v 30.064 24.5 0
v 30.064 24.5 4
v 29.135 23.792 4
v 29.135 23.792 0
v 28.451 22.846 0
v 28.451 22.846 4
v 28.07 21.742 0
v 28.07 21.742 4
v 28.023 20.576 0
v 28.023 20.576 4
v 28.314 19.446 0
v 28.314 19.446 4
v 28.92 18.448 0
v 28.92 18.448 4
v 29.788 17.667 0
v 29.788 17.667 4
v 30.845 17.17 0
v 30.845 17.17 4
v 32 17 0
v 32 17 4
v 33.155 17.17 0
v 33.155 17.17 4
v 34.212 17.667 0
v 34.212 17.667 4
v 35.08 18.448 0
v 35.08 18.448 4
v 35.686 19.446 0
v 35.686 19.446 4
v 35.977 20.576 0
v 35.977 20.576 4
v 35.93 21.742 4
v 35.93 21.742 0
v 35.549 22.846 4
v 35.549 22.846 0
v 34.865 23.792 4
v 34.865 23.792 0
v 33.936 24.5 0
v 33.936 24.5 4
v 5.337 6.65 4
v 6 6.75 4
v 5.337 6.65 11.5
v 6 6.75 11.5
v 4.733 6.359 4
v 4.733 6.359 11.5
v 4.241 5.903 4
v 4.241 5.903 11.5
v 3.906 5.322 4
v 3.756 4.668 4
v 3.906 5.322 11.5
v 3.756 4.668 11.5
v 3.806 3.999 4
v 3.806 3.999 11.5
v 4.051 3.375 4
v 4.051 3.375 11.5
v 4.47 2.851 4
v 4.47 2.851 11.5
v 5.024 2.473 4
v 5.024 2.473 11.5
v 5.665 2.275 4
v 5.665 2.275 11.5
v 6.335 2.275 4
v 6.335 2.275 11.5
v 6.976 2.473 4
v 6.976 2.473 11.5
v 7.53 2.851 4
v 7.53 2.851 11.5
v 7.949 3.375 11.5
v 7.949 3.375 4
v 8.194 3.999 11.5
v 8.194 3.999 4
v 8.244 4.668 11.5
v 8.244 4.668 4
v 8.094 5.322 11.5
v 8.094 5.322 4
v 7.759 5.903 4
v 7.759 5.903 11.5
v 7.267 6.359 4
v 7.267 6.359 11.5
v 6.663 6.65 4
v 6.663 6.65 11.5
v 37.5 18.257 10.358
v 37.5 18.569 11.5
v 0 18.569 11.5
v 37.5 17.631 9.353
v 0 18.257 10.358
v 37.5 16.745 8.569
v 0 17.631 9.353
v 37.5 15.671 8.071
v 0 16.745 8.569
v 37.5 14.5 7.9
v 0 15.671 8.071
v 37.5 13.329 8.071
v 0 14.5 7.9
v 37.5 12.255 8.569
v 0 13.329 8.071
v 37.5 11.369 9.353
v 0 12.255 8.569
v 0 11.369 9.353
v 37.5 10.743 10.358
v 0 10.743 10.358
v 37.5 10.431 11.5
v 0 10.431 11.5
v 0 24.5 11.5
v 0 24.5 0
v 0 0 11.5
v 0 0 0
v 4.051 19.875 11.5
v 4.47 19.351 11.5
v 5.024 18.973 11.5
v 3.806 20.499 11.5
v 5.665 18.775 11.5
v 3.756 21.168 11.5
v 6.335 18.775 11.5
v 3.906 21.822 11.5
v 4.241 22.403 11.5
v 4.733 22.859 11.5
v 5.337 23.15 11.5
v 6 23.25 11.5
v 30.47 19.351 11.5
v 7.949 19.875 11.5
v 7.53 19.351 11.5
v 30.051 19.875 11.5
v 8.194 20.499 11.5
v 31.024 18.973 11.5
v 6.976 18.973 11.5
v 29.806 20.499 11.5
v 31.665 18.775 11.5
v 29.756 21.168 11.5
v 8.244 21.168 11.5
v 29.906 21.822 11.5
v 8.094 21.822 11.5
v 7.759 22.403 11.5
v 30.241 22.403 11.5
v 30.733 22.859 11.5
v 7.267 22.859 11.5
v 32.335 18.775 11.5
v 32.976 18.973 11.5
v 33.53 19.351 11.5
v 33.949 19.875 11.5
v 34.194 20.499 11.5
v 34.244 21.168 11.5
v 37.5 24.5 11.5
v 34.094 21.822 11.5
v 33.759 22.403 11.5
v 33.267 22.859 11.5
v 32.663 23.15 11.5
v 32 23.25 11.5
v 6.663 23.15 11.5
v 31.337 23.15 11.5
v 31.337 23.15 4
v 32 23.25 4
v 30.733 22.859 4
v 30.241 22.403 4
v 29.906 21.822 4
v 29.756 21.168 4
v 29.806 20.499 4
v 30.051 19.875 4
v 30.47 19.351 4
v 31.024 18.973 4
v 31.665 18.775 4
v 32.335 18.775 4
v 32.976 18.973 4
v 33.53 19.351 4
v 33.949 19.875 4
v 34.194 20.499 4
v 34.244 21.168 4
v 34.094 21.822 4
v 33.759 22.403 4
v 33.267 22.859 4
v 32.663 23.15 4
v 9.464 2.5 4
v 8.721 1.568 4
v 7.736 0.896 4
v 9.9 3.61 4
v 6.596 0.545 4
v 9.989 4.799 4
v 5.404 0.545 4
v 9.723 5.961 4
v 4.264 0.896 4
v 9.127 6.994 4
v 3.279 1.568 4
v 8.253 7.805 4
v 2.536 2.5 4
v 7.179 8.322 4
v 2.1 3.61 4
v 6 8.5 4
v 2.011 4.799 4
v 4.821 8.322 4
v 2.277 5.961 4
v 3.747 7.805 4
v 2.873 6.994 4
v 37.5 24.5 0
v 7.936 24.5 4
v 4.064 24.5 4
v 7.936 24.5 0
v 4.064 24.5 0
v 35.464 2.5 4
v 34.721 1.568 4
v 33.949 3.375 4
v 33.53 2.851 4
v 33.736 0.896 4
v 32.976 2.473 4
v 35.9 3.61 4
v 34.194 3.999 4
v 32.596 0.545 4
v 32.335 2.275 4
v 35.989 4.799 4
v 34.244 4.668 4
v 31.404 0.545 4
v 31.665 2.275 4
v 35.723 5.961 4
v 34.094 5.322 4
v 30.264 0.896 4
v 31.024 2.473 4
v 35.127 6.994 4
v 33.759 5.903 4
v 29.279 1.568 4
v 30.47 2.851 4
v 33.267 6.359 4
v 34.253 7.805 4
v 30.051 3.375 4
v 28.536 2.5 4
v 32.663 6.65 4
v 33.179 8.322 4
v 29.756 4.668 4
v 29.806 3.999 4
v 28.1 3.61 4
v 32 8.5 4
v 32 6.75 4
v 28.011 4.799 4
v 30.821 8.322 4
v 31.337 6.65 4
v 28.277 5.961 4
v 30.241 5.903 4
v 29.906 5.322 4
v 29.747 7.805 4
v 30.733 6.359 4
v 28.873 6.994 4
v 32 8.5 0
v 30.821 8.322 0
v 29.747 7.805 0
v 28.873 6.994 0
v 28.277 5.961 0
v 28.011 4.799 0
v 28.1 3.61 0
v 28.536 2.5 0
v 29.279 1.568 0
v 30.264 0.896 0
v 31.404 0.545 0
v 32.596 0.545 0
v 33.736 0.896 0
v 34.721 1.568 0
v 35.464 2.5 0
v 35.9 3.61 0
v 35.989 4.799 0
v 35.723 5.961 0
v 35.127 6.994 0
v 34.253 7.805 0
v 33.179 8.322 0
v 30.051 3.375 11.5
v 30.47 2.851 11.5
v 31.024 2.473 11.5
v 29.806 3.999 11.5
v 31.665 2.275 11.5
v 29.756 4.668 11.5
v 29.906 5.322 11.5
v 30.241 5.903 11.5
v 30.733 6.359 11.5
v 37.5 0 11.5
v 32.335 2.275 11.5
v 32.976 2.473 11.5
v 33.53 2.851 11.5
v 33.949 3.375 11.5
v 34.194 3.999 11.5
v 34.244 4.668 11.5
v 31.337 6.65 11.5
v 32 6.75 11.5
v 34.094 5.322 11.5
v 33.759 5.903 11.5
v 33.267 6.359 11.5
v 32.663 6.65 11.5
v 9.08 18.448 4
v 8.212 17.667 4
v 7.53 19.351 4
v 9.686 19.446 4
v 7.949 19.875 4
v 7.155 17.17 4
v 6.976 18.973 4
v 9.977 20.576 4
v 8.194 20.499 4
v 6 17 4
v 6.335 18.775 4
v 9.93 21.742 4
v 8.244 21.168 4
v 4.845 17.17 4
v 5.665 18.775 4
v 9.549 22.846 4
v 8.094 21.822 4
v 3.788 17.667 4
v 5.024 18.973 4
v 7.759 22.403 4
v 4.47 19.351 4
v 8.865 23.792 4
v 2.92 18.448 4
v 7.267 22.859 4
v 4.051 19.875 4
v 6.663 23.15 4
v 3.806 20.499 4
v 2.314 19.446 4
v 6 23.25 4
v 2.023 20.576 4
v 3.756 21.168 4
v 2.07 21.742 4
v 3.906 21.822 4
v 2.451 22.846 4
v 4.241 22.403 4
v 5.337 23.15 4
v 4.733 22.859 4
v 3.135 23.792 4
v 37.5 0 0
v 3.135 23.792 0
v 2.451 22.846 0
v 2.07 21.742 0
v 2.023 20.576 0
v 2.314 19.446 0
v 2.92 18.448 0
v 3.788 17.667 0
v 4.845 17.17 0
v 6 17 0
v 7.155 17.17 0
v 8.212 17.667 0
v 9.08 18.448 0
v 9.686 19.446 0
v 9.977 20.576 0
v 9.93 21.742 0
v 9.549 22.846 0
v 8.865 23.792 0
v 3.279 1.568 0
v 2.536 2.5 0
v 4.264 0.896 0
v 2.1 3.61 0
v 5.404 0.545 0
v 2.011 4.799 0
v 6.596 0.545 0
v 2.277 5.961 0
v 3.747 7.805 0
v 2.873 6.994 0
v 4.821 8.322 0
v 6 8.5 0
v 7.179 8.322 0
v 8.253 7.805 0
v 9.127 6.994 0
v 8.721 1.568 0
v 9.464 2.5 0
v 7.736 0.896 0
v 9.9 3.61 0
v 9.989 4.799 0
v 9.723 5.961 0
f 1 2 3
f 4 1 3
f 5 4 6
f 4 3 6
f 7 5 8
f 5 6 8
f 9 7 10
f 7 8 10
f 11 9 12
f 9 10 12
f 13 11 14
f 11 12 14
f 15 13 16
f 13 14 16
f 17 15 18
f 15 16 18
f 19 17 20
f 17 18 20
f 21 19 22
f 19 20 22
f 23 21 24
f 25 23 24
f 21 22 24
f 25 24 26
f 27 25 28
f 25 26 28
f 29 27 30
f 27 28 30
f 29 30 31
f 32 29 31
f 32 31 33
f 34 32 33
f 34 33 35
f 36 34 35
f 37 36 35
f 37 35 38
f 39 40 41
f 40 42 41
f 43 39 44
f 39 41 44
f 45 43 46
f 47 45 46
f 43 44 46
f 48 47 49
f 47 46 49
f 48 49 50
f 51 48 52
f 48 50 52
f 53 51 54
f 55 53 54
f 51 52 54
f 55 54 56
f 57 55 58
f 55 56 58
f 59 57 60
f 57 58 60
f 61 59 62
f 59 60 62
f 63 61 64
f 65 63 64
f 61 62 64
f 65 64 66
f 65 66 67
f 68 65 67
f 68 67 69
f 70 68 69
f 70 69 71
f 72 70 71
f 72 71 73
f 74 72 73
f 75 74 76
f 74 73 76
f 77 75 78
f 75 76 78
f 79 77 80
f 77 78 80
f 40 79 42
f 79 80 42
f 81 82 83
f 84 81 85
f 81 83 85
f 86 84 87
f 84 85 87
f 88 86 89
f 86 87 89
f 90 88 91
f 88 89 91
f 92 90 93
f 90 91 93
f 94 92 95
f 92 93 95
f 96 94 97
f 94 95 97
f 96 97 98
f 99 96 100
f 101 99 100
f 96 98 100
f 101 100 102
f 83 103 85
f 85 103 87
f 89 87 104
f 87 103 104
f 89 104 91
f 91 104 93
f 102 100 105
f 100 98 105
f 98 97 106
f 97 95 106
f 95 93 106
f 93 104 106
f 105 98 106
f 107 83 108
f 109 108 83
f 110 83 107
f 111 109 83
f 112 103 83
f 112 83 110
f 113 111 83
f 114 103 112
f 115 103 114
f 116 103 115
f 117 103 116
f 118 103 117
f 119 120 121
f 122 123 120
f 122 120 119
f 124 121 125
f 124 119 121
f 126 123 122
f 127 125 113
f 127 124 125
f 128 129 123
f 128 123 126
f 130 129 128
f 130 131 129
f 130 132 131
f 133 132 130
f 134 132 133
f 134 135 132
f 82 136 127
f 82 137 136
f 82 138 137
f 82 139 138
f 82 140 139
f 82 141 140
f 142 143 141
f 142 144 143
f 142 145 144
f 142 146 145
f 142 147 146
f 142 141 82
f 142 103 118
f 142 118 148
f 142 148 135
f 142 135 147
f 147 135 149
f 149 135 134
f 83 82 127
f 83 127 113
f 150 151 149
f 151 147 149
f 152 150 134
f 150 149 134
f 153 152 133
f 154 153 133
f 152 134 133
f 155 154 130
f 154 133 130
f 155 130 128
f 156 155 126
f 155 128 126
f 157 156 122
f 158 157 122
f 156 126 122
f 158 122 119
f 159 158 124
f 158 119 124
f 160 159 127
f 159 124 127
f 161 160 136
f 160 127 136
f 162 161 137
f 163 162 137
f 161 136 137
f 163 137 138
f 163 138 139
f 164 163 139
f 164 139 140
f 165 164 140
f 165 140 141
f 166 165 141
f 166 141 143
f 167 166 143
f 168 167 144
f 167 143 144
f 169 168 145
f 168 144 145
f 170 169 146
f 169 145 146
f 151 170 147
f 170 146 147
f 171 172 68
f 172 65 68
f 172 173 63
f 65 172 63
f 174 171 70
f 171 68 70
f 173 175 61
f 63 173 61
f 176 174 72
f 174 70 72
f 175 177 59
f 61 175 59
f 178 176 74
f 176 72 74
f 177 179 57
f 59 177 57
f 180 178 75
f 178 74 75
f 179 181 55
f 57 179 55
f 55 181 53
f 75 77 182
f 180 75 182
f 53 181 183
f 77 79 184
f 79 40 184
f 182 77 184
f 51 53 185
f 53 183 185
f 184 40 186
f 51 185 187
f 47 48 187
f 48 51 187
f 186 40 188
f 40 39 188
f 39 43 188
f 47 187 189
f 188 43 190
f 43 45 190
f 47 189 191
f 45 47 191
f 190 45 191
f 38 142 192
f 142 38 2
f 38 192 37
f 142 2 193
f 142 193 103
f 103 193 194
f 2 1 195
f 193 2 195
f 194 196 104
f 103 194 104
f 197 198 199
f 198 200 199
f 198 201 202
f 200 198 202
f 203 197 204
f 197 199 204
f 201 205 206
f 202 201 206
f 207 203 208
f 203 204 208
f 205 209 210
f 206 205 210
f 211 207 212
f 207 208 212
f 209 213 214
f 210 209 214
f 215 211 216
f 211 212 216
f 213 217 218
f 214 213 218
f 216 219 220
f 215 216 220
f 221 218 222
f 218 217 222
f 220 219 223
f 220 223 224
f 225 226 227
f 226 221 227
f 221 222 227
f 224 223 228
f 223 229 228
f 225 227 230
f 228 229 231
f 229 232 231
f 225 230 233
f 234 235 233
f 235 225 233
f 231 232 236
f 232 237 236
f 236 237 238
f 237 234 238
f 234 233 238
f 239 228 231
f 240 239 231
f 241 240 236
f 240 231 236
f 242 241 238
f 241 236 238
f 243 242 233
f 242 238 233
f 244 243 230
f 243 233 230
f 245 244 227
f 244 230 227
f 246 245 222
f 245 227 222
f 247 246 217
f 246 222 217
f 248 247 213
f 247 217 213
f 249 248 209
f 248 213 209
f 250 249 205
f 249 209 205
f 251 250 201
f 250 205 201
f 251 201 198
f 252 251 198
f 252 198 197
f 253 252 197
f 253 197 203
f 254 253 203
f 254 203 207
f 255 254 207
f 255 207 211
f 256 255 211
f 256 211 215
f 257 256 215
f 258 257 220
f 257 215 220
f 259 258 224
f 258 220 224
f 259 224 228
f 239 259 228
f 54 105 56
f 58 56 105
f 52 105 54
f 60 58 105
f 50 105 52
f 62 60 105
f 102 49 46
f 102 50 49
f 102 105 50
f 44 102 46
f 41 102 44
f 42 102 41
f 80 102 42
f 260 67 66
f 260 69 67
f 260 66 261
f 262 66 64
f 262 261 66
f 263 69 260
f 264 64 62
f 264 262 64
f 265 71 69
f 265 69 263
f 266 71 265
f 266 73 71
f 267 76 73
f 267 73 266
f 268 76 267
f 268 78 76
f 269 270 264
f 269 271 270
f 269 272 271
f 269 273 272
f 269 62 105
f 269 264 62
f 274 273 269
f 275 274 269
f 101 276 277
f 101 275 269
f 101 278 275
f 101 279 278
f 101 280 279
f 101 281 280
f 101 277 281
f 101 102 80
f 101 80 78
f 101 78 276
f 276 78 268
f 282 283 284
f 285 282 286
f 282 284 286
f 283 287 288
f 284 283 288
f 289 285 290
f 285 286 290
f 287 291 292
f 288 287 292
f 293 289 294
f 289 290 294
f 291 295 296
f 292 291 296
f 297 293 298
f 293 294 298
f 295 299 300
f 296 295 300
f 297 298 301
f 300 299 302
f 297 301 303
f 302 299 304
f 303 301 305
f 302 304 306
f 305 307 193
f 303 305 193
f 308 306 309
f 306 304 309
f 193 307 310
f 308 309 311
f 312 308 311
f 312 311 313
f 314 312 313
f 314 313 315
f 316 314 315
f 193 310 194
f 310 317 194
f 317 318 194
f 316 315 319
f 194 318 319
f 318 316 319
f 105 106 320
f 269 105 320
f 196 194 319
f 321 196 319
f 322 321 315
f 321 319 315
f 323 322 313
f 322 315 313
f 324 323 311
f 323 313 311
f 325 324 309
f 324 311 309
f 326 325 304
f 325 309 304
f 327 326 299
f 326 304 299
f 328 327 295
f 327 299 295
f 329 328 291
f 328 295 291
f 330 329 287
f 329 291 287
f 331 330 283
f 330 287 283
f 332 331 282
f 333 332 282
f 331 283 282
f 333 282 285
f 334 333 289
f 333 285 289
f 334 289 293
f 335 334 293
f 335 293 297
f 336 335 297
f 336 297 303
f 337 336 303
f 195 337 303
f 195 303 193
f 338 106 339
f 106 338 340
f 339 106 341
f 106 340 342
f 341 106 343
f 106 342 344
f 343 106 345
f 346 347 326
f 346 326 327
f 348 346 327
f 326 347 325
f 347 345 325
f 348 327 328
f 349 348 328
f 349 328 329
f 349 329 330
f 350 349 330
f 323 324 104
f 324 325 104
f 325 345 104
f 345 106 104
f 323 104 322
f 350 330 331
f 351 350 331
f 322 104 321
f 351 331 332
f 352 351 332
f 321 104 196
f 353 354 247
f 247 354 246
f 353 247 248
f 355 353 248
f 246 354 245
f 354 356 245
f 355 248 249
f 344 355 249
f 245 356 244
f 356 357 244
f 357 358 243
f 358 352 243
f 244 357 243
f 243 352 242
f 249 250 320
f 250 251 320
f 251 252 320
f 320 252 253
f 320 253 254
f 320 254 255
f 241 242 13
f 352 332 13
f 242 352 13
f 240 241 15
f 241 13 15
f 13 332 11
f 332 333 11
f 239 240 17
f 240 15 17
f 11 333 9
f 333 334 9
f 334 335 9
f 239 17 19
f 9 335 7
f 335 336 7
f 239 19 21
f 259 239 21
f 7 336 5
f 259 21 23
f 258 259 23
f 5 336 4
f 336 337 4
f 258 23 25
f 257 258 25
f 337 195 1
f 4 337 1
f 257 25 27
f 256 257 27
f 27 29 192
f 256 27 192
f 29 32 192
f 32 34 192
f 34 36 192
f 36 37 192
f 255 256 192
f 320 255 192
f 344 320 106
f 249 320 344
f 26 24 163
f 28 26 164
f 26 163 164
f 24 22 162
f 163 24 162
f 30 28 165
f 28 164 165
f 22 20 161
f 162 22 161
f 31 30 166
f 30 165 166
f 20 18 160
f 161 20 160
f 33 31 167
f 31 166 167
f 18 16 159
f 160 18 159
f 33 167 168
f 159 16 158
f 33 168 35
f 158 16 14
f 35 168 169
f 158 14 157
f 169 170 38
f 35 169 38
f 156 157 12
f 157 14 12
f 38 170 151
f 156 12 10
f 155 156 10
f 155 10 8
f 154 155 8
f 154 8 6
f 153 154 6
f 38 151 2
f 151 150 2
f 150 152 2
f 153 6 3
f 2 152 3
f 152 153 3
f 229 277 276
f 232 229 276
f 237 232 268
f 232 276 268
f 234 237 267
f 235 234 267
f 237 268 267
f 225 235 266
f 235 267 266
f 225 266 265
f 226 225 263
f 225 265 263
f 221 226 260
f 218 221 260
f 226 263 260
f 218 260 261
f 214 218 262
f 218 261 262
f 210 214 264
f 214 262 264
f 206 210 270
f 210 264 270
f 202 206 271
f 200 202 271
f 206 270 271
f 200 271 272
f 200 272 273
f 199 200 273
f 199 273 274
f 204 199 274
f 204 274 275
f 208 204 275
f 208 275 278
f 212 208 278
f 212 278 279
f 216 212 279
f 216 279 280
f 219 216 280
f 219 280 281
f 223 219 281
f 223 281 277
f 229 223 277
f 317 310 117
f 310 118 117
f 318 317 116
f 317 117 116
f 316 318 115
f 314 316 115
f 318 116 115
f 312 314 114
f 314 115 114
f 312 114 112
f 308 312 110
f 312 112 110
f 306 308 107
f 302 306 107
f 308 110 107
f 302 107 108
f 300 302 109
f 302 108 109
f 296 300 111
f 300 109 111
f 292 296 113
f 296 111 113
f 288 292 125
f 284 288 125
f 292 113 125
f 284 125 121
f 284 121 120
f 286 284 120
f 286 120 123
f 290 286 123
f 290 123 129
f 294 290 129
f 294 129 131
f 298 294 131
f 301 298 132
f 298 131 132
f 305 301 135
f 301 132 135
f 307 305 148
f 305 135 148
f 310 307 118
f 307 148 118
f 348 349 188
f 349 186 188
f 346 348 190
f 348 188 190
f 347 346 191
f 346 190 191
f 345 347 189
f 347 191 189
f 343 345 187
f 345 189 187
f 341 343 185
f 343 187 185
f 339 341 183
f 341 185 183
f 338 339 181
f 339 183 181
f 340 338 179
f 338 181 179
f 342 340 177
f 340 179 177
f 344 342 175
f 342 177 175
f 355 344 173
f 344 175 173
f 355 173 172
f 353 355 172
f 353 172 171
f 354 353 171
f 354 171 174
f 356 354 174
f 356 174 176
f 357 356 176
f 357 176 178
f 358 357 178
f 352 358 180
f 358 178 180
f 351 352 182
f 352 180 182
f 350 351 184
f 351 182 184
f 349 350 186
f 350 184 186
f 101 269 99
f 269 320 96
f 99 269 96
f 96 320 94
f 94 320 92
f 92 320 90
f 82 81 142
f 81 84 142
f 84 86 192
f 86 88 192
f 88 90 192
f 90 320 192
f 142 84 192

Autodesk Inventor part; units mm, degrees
ref_plane "YZ Plane" through (0, 0, 0) normal (1, 0, 0) x (0, 1, 0)
ref_plane "XZ Plane" through (0, 0, 0) normal (0, 1, 0) x (-1, 0, 0)
ref_plane "XY Plane" through (0, 0, 0) normal (0, 0, 1) x (1, 0, 0)
sketch "Sketch1" plane through (0, 0, 0) normal (0, 0, 1) x (1, 0, 0)
  line L0 (0, 0) -> (37.5, 0)
  line L1 (37.5, 0) -> (37.5, 24.5)
  line L2 (37.5, 24.5) -> (0, 24.5)
  line L3 (0, 24.5) -> (0, 0)
  dimension "d0" = 37.5
  dimension "d1" = 24.5
extrude "Extrusion1" add sketch "Sketch1" along normal blind 11.5
sketch "Sketch2" plane through (0, 0, 0) normal (-1, 0, 0) x (0, 0, 1)
  line L0 (11.5, 24.5) -> (11.5, 0) projected
  line L1 (0, 24.5) -> (11.5, 24.5) projected
  circle A0 centre (12, 14.5) radius 4.1
  dimension "d4" = 8.2
  dimension "d5" = 0.5
  dimension "d6" = 10
extrude "Extrusion2" cut sketch "Sketch2" against normal up to surface (37.5 mm away)
sketch "Sketch3" plane through (0, 0, 0) normal (0, 0, -1) x (-1, 0, 0)
  line L0 (0, 24.5) -> (0, 0) projected
  line L1 (0, 18.5694) -> (0, 10.4306) projected
  line L2 (0, 0) -> (-37.5, 0) projected
  point P0 (-6, 21)
  point P1 (-32, 21)
  point P2 (-32, 4.5)
  point P3 (-6, 4.5)
  dimension "d9" = 6
  dimension "d10" = 32
  dimension "d30" = 4.5
  dimension "d32" = 21
hole "Hole1" at (6, 21, 0) at (32, 21, 0) at (32, 4.5, 0) at (6, 4.5, 0) direction (0, 0, 1) diameter 4.5 depth 11.5 counterbore diameter 8 counterbore depth 4
properties part number "YMotorCapLeft" material "ABS Plastic"
